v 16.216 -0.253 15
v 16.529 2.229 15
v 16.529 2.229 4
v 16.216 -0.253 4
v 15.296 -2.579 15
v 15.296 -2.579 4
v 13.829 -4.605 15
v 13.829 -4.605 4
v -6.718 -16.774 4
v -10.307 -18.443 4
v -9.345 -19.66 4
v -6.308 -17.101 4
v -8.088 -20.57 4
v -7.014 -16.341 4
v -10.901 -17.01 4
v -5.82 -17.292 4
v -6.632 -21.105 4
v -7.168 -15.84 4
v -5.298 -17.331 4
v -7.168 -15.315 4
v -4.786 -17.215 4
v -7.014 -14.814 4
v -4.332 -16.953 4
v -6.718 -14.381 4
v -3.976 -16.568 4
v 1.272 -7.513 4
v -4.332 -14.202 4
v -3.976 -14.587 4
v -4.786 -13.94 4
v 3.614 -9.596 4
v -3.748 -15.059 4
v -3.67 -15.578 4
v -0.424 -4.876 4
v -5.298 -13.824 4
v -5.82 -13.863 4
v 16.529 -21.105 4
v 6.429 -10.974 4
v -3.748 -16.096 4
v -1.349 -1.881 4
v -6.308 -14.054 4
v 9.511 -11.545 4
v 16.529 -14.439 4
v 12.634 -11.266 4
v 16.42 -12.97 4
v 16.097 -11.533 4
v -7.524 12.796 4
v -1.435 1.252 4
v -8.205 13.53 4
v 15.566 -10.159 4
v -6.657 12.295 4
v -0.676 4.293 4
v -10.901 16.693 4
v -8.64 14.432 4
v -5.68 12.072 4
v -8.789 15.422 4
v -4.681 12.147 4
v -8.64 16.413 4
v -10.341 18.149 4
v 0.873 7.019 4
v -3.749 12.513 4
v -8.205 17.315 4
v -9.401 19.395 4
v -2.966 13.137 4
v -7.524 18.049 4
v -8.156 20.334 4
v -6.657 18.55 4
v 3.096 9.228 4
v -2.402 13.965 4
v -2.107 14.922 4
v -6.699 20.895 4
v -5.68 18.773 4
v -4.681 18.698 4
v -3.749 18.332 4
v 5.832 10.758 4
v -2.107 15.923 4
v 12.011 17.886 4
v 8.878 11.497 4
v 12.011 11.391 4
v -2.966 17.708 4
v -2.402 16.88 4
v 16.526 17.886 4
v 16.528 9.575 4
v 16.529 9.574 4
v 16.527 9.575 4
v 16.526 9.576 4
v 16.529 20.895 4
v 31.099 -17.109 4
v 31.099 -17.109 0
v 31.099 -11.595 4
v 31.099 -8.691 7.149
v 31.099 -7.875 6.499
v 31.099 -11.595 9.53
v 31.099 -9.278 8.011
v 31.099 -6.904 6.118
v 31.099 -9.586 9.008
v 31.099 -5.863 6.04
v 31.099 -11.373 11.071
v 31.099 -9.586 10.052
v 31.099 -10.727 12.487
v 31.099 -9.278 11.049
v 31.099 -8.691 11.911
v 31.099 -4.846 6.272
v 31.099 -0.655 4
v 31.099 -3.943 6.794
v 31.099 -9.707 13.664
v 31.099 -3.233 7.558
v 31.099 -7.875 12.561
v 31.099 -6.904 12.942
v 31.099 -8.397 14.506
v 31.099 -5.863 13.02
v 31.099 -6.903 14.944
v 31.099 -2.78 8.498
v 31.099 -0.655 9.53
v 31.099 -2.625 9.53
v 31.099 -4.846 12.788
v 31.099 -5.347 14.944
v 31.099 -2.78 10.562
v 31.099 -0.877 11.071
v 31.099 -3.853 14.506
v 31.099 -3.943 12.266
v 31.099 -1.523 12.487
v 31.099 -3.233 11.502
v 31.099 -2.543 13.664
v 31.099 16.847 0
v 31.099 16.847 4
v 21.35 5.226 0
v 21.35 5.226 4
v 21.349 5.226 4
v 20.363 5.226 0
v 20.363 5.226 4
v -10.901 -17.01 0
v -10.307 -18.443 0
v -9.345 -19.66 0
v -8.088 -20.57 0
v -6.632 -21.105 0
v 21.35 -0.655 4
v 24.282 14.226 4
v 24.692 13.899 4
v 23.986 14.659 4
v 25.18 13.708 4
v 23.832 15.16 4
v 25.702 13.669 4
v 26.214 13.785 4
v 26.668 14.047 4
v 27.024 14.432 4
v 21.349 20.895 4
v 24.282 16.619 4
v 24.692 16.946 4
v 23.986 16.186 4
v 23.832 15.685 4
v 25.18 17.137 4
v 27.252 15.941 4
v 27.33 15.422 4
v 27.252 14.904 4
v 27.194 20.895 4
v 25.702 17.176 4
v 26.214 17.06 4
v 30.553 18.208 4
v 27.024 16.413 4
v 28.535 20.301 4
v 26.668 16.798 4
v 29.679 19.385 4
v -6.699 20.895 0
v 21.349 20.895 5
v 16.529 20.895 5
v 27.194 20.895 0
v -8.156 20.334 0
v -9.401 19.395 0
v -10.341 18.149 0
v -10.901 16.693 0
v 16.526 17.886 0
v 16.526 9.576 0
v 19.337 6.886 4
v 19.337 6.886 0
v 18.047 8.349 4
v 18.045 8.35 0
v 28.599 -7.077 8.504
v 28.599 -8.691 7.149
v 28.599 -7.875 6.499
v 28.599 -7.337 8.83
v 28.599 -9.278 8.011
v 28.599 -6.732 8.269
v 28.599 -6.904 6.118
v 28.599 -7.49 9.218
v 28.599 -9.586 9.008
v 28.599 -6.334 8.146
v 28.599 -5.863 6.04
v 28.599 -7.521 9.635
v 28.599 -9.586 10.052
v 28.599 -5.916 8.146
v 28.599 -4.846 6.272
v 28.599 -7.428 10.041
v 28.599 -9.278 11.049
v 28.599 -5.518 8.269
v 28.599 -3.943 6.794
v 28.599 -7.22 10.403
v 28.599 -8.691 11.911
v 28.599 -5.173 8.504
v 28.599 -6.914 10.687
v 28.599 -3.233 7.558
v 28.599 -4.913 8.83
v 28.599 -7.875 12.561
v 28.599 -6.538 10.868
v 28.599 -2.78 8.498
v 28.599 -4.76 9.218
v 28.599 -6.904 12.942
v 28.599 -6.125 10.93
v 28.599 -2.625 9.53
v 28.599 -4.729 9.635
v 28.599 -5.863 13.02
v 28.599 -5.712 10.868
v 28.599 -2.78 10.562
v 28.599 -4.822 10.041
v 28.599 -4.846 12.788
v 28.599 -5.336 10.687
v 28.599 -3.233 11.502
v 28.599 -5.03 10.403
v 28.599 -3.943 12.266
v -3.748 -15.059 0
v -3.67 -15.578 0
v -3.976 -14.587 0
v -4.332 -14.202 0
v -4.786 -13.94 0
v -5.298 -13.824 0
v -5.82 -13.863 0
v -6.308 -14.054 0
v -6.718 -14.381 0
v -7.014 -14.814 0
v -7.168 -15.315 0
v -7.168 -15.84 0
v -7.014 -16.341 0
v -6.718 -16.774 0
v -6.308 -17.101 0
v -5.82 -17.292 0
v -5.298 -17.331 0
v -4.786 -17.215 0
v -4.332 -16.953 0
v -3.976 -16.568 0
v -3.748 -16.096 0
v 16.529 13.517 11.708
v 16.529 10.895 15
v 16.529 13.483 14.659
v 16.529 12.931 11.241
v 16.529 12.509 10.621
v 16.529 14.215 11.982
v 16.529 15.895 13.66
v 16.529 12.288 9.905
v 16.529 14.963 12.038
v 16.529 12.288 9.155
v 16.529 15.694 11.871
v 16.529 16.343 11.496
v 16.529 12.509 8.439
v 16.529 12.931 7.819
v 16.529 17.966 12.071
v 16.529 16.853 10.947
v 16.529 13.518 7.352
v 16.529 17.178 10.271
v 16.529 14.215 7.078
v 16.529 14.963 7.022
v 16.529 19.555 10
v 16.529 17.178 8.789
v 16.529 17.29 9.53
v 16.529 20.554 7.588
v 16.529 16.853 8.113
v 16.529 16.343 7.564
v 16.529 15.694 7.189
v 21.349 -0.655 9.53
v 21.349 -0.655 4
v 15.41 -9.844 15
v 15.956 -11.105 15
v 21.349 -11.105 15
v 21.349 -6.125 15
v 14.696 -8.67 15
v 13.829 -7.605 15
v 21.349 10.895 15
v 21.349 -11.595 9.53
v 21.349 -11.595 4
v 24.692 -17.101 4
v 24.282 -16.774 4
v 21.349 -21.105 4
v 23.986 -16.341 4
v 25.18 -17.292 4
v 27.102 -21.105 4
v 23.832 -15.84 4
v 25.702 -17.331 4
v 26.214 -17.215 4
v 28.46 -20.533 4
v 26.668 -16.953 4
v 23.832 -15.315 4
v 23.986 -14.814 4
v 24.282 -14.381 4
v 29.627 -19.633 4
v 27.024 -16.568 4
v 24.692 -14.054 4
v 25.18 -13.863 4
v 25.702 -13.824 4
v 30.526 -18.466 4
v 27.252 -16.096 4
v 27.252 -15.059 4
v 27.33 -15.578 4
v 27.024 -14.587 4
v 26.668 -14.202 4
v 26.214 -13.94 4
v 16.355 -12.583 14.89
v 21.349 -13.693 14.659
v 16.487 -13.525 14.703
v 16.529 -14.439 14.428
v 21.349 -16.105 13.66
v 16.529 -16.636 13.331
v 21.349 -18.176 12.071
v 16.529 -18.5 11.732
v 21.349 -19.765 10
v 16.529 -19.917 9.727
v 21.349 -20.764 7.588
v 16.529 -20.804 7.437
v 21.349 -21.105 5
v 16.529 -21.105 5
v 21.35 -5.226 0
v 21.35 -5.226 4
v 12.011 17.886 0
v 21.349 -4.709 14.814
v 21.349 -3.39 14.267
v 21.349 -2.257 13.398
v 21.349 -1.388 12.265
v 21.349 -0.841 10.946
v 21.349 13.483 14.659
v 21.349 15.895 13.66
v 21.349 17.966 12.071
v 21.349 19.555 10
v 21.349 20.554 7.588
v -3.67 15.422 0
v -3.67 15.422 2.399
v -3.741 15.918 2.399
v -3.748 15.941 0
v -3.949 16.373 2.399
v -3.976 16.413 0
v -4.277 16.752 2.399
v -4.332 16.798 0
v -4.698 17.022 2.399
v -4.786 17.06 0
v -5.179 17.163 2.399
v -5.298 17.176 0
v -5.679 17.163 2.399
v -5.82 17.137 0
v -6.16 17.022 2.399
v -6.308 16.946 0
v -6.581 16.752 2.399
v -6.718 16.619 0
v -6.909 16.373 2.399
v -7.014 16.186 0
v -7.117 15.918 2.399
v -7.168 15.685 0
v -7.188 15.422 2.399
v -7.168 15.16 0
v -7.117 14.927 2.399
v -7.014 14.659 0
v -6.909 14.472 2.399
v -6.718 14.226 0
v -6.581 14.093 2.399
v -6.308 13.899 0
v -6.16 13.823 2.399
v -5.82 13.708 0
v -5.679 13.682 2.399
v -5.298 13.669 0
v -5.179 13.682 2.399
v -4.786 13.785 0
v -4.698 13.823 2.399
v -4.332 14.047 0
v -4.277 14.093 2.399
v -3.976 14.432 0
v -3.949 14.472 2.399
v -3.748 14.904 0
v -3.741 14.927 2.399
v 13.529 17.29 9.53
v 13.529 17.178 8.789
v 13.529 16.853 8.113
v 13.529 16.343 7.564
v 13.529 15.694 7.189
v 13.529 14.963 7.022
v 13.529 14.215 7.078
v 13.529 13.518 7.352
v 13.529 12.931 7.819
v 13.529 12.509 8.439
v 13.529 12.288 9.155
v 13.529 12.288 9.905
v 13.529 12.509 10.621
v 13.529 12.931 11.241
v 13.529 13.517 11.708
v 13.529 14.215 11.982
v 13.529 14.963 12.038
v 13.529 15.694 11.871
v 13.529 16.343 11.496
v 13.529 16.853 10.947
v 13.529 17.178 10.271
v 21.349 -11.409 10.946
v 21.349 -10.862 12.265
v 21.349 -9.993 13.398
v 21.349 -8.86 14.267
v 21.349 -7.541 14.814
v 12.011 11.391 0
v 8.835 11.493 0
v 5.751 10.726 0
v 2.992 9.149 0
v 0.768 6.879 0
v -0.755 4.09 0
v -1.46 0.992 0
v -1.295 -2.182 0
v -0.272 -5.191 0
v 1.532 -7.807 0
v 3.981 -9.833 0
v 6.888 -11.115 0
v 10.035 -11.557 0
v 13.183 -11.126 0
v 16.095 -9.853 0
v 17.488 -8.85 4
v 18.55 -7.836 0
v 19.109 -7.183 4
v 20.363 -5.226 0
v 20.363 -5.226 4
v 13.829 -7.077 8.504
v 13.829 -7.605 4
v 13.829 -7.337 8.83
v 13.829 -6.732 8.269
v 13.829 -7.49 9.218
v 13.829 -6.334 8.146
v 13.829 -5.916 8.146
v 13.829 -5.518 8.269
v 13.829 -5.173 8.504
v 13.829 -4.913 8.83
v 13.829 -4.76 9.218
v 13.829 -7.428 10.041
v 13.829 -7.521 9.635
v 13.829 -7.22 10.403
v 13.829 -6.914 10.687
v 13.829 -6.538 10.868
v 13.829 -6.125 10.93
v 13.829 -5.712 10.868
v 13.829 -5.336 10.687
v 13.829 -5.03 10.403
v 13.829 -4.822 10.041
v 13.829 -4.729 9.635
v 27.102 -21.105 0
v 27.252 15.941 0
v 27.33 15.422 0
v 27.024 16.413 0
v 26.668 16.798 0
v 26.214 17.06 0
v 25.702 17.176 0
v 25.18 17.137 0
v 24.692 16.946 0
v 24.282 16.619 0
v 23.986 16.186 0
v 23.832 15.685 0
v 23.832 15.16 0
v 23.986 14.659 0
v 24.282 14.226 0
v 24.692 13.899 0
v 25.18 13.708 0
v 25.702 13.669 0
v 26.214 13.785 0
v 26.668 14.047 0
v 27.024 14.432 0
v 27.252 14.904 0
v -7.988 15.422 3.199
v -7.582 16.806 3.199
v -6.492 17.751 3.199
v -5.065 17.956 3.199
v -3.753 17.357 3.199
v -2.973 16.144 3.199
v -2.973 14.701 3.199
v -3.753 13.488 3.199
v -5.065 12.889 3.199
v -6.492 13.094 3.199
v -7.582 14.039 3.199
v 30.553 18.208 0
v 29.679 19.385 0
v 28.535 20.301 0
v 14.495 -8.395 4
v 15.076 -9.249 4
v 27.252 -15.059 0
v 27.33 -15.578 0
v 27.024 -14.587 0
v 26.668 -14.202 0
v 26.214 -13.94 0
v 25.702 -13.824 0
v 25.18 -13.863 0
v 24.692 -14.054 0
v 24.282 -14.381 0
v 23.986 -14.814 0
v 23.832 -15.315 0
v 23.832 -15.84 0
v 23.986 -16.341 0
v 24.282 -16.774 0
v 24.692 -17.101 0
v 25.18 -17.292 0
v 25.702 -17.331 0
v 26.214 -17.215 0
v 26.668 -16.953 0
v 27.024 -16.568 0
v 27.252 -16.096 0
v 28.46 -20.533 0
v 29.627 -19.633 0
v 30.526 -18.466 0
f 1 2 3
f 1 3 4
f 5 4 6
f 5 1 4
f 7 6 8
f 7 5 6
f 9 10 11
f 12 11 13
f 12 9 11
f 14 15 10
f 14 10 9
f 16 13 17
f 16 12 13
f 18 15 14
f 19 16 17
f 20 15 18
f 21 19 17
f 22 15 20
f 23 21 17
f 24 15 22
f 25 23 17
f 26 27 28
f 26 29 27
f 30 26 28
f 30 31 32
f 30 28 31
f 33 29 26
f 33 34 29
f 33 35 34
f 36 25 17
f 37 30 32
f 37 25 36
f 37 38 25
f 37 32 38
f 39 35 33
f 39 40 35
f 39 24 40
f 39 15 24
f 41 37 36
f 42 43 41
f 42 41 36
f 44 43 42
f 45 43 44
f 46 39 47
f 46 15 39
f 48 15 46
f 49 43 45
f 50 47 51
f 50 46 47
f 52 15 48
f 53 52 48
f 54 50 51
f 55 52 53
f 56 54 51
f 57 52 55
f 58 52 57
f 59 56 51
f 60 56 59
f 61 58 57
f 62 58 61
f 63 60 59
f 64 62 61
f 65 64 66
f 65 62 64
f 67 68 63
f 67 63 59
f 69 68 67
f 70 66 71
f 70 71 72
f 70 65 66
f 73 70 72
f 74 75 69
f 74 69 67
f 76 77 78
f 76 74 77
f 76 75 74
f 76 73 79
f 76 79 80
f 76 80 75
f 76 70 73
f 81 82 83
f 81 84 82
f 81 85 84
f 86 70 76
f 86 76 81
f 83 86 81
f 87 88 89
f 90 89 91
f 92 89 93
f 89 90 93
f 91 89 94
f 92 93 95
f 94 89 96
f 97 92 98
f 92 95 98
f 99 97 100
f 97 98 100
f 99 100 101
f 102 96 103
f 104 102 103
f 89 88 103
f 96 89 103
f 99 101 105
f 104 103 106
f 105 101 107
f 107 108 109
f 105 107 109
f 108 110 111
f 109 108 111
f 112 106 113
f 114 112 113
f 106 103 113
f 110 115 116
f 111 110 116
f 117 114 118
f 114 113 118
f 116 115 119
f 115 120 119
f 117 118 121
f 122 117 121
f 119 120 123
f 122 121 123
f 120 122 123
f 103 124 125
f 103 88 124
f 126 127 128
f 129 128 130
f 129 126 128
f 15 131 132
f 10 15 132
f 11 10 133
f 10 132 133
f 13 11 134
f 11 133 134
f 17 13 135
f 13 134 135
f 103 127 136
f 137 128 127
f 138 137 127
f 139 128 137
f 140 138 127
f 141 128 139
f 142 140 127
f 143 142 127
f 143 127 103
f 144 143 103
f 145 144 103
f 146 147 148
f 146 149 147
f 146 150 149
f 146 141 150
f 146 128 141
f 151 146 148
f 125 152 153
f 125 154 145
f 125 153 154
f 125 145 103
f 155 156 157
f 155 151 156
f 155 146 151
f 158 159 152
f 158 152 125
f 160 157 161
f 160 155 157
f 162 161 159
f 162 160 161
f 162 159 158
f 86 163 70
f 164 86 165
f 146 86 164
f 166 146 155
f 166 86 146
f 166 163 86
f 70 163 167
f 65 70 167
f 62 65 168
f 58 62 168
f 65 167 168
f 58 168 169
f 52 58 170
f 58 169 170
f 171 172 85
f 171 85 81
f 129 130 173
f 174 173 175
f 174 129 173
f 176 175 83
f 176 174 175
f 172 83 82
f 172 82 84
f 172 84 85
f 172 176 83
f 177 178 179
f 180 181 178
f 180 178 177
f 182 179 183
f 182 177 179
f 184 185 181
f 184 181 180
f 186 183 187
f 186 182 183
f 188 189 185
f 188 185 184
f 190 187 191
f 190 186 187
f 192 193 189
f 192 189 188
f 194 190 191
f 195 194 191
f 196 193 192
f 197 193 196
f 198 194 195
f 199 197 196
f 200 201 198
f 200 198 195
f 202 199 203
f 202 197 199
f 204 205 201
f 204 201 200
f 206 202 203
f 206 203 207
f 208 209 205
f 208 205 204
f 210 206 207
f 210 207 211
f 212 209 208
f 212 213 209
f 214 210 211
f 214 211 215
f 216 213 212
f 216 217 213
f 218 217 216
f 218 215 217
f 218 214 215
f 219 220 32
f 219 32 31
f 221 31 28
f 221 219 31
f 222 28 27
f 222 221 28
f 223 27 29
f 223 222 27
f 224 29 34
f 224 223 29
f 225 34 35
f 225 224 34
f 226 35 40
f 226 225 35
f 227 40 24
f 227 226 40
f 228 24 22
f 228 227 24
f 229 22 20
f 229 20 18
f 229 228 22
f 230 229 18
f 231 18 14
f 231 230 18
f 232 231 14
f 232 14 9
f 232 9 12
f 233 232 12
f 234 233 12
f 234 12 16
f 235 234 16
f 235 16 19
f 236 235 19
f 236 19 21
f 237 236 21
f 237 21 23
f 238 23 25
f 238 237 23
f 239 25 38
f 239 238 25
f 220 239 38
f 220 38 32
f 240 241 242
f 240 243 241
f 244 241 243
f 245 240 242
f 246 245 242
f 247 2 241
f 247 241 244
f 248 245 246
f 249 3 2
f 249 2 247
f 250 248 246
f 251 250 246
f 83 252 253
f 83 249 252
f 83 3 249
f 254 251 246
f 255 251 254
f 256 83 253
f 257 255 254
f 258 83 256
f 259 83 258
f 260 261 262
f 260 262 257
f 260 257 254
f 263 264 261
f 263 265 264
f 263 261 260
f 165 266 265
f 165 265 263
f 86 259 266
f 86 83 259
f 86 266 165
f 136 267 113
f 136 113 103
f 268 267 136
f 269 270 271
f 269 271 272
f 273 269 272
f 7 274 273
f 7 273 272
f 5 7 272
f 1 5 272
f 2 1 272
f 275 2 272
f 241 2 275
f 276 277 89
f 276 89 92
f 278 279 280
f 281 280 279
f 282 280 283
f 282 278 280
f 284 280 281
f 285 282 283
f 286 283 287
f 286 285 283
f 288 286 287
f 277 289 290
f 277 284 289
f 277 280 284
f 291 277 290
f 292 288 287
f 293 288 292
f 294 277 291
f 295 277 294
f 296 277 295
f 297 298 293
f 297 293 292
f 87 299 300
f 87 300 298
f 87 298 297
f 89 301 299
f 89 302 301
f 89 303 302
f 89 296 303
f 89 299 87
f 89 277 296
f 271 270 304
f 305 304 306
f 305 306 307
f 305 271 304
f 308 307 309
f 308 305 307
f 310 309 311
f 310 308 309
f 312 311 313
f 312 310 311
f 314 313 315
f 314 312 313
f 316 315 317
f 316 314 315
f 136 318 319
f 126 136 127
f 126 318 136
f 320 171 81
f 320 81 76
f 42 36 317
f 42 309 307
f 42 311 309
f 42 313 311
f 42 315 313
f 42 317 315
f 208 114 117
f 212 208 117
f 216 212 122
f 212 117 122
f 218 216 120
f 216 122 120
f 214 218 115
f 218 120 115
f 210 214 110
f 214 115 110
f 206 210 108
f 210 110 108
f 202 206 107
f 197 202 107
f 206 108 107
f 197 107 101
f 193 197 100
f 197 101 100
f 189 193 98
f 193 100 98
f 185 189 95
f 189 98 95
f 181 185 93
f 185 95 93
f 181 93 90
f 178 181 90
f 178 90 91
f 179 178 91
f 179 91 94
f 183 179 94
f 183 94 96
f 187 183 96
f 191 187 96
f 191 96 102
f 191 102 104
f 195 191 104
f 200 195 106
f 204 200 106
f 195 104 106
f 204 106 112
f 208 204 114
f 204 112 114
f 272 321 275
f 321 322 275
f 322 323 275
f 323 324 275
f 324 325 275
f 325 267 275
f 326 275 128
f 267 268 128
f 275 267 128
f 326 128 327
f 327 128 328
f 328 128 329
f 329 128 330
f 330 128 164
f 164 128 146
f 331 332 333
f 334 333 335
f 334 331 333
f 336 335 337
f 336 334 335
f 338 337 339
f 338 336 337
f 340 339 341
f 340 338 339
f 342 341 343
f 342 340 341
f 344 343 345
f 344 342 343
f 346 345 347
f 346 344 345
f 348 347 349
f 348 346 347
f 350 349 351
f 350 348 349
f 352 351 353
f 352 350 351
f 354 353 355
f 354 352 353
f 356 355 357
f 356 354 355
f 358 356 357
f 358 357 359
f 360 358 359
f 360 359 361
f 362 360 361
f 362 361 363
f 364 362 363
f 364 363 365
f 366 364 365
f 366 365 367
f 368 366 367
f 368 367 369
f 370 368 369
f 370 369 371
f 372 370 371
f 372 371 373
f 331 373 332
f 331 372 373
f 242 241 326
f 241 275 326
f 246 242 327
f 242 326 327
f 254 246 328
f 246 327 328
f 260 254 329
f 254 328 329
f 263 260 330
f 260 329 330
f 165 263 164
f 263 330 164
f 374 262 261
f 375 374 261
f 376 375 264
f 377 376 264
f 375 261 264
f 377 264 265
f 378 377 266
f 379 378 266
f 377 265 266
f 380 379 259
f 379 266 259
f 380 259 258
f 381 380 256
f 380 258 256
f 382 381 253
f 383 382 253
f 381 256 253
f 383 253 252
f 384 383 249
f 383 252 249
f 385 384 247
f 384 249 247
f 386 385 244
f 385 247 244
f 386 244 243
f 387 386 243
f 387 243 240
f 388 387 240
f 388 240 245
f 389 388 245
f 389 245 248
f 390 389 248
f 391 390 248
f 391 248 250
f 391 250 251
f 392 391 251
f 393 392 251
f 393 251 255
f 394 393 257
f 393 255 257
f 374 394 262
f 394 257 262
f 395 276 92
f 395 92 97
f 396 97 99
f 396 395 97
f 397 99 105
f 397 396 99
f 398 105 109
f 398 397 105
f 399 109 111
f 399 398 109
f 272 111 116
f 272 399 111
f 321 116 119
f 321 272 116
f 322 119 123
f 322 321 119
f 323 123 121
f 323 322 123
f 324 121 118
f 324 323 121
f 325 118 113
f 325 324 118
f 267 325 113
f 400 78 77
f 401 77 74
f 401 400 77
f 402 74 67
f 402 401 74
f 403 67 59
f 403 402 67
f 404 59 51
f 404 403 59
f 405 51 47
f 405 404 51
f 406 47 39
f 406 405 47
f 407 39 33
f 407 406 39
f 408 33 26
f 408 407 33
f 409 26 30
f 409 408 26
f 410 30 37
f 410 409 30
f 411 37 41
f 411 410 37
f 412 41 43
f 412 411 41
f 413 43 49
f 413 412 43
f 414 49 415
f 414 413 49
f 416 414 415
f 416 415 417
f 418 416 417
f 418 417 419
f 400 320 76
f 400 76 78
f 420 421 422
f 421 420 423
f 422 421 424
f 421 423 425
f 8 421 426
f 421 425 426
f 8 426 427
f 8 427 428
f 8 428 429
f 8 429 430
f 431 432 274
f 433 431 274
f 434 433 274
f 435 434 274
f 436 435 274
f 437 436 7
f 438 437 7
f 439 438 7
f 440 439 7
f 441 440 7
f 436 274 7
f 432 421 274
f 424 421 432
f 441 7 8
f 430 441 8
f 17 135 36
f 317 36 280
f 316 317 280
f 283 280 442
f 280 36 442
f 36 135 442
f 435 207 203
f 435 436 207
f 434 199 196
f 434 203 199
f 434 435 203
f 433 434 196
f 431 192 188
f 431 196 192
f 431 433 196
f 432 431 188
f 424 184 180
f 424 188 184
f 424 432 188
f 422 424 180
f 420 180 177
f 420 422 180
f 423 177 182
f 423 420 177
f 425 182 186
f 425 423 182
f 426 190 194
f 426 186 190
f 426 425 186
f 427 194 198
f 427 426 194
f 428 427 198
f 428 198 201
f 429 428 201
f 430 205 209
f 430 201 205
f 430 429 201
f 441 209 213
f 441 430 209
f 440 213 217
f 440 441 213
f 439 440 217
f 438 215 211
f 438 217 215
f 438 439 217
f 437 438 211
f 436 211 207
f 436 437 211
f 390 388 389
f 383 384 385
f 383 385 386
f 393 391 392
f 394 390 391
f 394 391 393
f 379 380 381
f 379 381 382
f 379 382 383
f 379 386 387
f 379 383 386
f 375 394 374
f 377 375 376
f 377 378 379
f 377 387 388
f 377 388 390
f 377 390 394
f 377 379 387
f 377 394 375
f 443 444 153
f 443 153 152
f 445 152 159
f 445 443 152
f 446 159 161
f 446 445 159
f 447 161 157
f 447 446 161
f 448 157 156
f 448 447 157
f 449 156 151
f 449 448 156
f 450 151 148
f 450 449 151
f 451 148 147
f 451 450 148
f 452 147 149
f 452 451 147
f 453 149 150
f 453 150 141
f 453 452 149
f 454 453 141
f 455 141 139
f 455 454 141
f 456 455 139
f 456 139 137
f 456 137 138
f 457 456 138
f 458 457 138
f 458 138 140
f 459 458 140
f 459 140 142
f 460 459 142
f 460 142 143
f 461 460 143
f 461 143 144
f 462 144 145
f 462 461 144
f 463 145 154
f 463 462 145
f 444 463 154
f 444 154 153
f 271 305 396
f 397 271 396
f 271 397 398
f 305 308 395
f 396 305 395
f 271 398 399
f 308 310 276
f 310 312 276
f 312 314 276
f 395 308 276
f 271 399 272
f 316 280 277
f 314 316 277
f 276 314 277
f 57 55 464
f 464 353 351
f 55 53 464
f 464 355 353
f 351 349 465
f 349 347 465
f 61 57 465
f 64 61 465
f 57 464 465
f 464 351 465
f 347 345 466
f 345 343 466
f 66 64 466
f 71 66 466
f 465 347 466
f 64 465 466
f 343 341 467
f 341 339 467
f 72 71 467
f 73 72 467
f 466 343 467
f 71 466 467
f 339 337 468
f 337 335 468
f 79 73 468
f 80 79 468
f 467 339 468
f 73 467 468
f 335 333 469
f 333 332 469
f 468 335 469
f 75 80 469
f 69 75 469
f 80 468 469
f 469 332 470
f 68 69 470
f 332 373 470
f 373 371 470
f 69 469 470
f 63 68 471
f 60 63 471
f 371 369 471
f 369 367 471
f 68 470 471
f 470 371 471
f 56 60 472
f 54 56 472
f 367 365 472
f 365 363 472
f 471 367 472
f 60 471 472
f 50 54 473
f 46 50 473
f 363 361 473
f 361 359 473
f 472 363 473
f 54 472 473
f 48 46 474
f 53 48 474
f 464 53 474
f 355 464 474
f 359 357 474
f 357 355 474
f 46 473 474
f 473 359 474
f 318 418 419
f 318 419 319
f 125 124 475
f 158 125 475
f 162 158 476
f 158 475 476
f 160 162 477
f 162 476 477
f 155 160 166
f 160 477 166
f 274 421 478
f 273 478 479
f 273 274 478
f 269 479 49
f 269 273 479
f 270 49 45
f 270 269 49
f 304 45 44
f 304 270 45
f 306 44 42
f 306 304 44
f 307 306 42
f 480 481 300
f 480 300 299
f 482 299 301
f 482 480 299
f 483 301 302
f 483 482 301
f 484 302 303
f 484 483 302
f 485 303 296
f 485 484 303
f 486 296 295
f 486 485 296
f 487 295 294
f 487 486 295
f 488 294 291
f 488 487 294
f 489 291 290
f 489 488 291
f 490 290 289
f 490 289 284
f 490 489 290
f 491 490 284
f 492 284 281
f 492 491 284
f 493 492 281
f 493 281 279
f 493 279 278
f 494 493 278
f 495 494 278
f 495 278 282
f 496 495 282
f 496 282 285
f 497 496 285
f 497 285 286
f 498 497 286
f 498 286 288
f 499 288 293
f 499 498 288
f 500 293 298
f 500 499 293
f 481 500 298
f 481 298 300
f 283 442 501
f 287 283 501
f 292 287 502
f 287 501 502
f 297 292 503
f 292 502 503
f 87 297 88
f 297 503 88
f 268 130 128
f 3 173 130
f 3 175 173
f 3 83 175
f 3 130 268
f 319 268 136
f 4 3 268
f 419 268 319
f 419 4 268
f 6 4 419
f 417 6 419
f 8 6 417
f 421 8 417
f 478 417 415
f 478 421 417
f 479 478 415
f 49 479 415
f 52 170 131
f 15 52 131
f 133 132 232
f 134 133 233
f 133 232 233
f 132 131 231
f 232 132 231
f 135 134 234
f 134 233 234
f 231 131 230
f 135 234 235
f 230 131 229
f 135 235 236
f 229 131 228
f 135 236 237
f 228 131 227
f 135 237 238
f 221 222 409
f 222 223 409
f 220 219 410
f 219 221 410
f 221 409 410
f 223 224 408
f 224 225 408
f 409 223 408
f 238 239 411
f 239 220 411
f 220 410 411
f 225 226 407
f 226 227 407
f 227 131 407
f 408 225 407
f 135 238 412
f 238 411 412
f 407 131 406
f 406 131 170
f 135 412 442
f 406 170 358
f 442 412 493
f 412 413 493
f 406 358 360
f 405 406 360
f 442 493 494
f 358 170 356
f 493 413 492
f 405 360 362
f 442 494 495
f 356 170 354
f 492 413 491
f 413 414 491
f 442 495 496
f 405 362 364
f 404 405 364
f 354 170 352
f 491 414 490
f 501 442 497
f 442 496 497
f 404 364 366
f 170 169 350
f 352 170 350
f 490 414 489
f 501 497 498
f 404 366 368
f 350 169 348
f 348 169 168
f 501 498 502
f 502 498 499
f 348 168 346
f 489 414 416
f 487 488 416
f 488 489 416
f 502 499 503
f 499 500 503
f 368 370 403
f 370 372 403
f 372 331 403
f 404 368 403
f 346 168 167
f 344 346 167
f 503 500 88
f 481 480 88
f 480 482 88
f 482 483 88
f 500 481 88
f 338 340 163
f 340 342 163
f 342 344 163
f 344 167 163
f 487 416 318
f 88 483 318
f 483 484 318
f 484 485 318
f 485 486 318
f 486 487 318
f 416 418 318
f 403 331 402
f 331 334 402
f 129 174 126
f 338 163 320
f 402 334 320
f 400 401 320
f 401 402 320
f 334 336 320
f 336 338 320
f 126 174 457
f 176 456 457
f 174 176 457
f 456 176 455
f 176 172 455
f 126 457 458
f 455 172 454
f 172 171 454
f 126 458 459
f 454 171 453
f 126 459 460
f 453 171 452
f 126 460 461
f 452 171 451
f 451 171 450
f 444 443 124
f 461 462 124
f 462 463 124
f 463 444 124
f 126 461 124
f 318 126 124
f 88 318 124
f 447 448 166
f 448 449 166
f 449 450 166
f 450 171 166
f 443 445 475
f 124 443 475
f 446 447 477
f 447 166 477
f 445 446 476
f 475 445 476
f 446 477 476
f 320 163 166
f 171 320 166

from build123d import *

# Parameters (mm, degrees)
CROQUIS2_R                                           = 1.75875
SALIENTE_EXTRUIR1_DEPTH                              = 4
CROQUIS3_W                                           = 4.82
CROQUIS3_H                                           = 42
SALIENTE_EXTRUIR2_DEPTH                              = 11
CROQUIS5_R                                           = 2.515
SALIENTE_EXTRUIR3_DEPTH                              = 3
CROQUIS6_W                                           = 2.7
CROQUIS6_H                                           = 3
SALIENTE_EXTRUIR4_DEPTH                              = 11
REDONDEO1_R                                          = 10
CORTAR_EXTRUIR1_REACH                                = 37.805
CROQUIS8_R                                           = 1.4
REDONDEO2_R                                          = 10
CROQUIS9_R                                           = 1.4
SALIENTE_EXTRUIR5_DEPTH                              = 9.75
CROQUIS10_R                                          = 3.5
CORTAR_EXTRUIR2_DEPTH                                = 2.5
REFRENTADO_PARA_TORNILLO_TAP_N_CON_CABEZ_D           = 3.3
REFRENTADO_PARA_TORNILLO_TAP_N_CON_CABEZ_CSINK_D     = 6.72
REFRENTADO_PARA_TORNILLO_TAP_N_CON_CABEZ_CSINK_ANGLE = 90


with BuildPart() as part:
    # Croquis2 → Saliente-Extruir1 (new body)
    with BuildSketch(Plane.XY):
        with BuildLine():
            Line((-10.901498769, 16.692640248), (-10.901498769, -17.009890921))
            ThreePointArc((-10.901498769, -17.009890921), (-9.344660807, -19.660096087), (-6.631805383, -21.105))
            Line((-6.631805383, -21.105), (27.102123863, -21.105))
            ThreePointArc((27.102123863, -21.105), (29.626712806, -19.633211575), (31.098501231, -17.108622633))
            Line((31.098501231, -17.108622633), (31.098501231, 16.847284537))
            ThreePointArc((31.098501231, 16.847284537), (29.679453987, 19.385312533), (27.194272919, 20.895))
            Line((27.194272919, 20.895), (-6.699139018, 20.895))
            ThreePointArc((-6.699139018, 20.895), (-9.401498769, 19.395), (-10.901498769, 16.692640248))
        make_face()
        with Locations((-5.428998769, 15.4225)):
            Circle(CROQUIS2_R, mode=Mode.SUBTRACT)
        with Locations((25.571001231, 15.4225)):
            Circle(CROQUIS2_R, mode=Mode.SUBTRACT)
        with Locations((25.571001231, -15.5775)):
            Circle(CROQUIS2_R, mode=Mode.SUBTRACT)
        with Locations((-5.428998769, -15.5775)):
            Circle(CROQUIS2_R, mode=Mode.SUBTRACT)
        with BuildLine():
            Line((20.363327993, -5.226), (21.350001231, -5.226))
            Line((21.350001231, -5.226), (21.350001231, 5.225999923))
            Line((21.350001231, 5.225999923), (20.363328032, 5.225999923))
            ThreePointArc((20.363328032, 5.225999923), (18.722008699, 7.645662593), (16.526001231, 9.57601173))
            Line((16.526001231, 9.57601173), (16.526001231, 17.886))
            Line((16.526001231, 17.886), (12.011001231, 17.886))
            Line((12.011001231, 17.886), (12.011001231, 11.390753987))
            ThreePointArc((12.011001231, 11.390753987), (-0.271544795, -5.190509466), (20.363327993, -5.226))
        make_face(mode=Mode.SUBTRACT)
    extrude(amount=SALIENTE_EXTRUIR1_DEPTH)

    # Croquis3 → Saliente-Extruir2 (add)
    with BuildSketch(Plane.XY.offset(4)):
        with Locations((18.938501231, -0.105)):
            Rectangle(CROQUIS3_W, CROQUIS3_H)
    extrude(amount=SALIENTE_EXTRUIR2_DEPTH)

    # Croquis5 → Saliente-Extruir3 (add)
    with BuildSketch(Plane.ZY.offset(-16.528501231)):
        with Locations(Location((9.53, 14.775, 0), (0, 0, 90))):
            Circle(CROQUIS5_R)
    extrude(amount=SALIENTE_EXTRUIR3_DEPTH)

    # Croquis6 → Saliente-Extruir4 (add)
    with BuildSketch(Plane.XY.offset(15)):
        with Locations((15.178501231, -6.105)):
            Rectangle(CROQUIS6_W, CROQUIS6_H)
    extrude(amount=-SALIENTE_EXTRUIR4_DEPTH)

    # Redondeo1
    # the kernel refuses this fillet: 10 mm, written as the material it adds along each edge
    with BuildSketch(Plane(origin=(16.528501231, -4.605, 15), x_dir=(0, 1, 0), z_dir=(0, 0, -1))) as redondeo1_piece_1:
        with BuildLine():
            CenterArc((6.83447145, -10), REDONDEO1_R, 90, 43.113605946)
            Line((0, -2.7), (-0.136689429, -2.554))
            ThreePointArc((-0.136689429, -2.554), (-0.2, -1.35), (-0.2, 0))
            Line((-0.2, 0), (0, 0.2))
            Line((0, 0.2), (6.83447145, 0.2))
            Line((6.83447145, 0.2), (6.83447145, 0))
        make_face()
    extrude(amount=11)
    with BuildSketch(Plane(origin=(16.528501231, -7.605, 15), x_dir=(0, -1, 0), z_dir=(0, 0, -1))) as redondeo1_piece_2:
        with BuildLine():
            CenterArc((6.83447145, 10), REDONDEO1_R, 226.886394054, 43.113605946)
            Line((0, 2.7), (-0.136689429, 2.554))
            ThreePointArc((-0.136689429, 2.554), (-0.2, 1.35), (-0.2, 0))
            Line((-0.2, 0), (0, -0.2))
            Line((0, -0.2), (6.83447145, -0.2))
            Line((6.83447145, -0.2), (6.83447145, 0))
        make_face()
    extrude(amount=11)

    # Croquis8 → Cortar-Extruir1 (cut, up to next)
    with BuildSketch(Plane.ZY.offset(-13.828501231), mode=Mode.PRIVATE) as cortar_extruir1_sk1:
        with Locations((9.53, -6.125)):
            Circle(CROQUIS8_R)
    cortar_extruir1_tool1 = extrude(cortar_extruir1_sk1.sketch, amount=-CORTAR_EXTRUIR1_REACH, mode=Mode.PRIVATE) & part.part
    add(cortar_extruir1_tool1.solids().sort_by_distance((13.828501, -6.125, 9.53))[0], mode=Mode.SUBTRACT)

    # Redondeo2
    redondeo2_edges = [part.edges().sort_by_distance(p)[0] for p in [
        (18.938501231, -21.105, 15),
        (18.938501231, 20.895, 15),
    ]]
    fillet(redondeo2_edges, radius=REDONDEO2_R)

    # Croquis9 → Saliente-Extruir5 (add)
    with BuildSketch(Plane(origin=(21.348501231, 0, 0), x_dir=(0, 0, -1), z_dir=(1, 0, 0))):
        with BuildLine():
            Line((-9.53, -0.655), (-4, -0.655))
            Line((-4, -0.655), (-4, -11.595))
            Line((-4, -11.595), (-9.53, -11.595))
            ThreePointArc((-9.53, -11.595), (-15, -6.125), (-9.53, -0.655))
        make_face()
        with Locations(Location((-9.53, -6.125, 0), (0, 0, 180))):
            Circle(CROQUIS9_R, mode=Mode.SUBTRACT)
    extrude(amount=SALIENTE_EXTRUIR5_DEPTH)

    # Croquis10 → Cortar-Extruir2 (cut)
    with BuildSketch(Plane(origin=(31.098501231, 0, 0), x_dir=(0, 0, -1), z_dir=(1, 0, 0))):
        with Locations(Location((-9.53, -6.125, 0), (0, 0, 90))):
            Circle(CROQUIS10_R)
    extrude(amount=-CORTAR_EXTRUIR2_DEPTH, mode=Mode.SUBTRACT)

    # Refrentado para tornillo tapón con cabeza plana de clavija de M31 (through all)
    with Locations(Plane.XY.offset(4)):
        with Locations((-5.428998769, 15.4225)):
            CounterSinkHole(REFRENTADO_PARA_TORNILLO_TAP_N_CON_CABEZ_D / 2, REFRENTADO_PARA_TORNILLO_TAP_N_CON_CABEZ_CSINK_D / 2, counter_sink_angle=REFRENTADO_PARA_TORNILLO_TAP_N_CON_CABEZ_CSINK_ANGLE)


solid = part.part
